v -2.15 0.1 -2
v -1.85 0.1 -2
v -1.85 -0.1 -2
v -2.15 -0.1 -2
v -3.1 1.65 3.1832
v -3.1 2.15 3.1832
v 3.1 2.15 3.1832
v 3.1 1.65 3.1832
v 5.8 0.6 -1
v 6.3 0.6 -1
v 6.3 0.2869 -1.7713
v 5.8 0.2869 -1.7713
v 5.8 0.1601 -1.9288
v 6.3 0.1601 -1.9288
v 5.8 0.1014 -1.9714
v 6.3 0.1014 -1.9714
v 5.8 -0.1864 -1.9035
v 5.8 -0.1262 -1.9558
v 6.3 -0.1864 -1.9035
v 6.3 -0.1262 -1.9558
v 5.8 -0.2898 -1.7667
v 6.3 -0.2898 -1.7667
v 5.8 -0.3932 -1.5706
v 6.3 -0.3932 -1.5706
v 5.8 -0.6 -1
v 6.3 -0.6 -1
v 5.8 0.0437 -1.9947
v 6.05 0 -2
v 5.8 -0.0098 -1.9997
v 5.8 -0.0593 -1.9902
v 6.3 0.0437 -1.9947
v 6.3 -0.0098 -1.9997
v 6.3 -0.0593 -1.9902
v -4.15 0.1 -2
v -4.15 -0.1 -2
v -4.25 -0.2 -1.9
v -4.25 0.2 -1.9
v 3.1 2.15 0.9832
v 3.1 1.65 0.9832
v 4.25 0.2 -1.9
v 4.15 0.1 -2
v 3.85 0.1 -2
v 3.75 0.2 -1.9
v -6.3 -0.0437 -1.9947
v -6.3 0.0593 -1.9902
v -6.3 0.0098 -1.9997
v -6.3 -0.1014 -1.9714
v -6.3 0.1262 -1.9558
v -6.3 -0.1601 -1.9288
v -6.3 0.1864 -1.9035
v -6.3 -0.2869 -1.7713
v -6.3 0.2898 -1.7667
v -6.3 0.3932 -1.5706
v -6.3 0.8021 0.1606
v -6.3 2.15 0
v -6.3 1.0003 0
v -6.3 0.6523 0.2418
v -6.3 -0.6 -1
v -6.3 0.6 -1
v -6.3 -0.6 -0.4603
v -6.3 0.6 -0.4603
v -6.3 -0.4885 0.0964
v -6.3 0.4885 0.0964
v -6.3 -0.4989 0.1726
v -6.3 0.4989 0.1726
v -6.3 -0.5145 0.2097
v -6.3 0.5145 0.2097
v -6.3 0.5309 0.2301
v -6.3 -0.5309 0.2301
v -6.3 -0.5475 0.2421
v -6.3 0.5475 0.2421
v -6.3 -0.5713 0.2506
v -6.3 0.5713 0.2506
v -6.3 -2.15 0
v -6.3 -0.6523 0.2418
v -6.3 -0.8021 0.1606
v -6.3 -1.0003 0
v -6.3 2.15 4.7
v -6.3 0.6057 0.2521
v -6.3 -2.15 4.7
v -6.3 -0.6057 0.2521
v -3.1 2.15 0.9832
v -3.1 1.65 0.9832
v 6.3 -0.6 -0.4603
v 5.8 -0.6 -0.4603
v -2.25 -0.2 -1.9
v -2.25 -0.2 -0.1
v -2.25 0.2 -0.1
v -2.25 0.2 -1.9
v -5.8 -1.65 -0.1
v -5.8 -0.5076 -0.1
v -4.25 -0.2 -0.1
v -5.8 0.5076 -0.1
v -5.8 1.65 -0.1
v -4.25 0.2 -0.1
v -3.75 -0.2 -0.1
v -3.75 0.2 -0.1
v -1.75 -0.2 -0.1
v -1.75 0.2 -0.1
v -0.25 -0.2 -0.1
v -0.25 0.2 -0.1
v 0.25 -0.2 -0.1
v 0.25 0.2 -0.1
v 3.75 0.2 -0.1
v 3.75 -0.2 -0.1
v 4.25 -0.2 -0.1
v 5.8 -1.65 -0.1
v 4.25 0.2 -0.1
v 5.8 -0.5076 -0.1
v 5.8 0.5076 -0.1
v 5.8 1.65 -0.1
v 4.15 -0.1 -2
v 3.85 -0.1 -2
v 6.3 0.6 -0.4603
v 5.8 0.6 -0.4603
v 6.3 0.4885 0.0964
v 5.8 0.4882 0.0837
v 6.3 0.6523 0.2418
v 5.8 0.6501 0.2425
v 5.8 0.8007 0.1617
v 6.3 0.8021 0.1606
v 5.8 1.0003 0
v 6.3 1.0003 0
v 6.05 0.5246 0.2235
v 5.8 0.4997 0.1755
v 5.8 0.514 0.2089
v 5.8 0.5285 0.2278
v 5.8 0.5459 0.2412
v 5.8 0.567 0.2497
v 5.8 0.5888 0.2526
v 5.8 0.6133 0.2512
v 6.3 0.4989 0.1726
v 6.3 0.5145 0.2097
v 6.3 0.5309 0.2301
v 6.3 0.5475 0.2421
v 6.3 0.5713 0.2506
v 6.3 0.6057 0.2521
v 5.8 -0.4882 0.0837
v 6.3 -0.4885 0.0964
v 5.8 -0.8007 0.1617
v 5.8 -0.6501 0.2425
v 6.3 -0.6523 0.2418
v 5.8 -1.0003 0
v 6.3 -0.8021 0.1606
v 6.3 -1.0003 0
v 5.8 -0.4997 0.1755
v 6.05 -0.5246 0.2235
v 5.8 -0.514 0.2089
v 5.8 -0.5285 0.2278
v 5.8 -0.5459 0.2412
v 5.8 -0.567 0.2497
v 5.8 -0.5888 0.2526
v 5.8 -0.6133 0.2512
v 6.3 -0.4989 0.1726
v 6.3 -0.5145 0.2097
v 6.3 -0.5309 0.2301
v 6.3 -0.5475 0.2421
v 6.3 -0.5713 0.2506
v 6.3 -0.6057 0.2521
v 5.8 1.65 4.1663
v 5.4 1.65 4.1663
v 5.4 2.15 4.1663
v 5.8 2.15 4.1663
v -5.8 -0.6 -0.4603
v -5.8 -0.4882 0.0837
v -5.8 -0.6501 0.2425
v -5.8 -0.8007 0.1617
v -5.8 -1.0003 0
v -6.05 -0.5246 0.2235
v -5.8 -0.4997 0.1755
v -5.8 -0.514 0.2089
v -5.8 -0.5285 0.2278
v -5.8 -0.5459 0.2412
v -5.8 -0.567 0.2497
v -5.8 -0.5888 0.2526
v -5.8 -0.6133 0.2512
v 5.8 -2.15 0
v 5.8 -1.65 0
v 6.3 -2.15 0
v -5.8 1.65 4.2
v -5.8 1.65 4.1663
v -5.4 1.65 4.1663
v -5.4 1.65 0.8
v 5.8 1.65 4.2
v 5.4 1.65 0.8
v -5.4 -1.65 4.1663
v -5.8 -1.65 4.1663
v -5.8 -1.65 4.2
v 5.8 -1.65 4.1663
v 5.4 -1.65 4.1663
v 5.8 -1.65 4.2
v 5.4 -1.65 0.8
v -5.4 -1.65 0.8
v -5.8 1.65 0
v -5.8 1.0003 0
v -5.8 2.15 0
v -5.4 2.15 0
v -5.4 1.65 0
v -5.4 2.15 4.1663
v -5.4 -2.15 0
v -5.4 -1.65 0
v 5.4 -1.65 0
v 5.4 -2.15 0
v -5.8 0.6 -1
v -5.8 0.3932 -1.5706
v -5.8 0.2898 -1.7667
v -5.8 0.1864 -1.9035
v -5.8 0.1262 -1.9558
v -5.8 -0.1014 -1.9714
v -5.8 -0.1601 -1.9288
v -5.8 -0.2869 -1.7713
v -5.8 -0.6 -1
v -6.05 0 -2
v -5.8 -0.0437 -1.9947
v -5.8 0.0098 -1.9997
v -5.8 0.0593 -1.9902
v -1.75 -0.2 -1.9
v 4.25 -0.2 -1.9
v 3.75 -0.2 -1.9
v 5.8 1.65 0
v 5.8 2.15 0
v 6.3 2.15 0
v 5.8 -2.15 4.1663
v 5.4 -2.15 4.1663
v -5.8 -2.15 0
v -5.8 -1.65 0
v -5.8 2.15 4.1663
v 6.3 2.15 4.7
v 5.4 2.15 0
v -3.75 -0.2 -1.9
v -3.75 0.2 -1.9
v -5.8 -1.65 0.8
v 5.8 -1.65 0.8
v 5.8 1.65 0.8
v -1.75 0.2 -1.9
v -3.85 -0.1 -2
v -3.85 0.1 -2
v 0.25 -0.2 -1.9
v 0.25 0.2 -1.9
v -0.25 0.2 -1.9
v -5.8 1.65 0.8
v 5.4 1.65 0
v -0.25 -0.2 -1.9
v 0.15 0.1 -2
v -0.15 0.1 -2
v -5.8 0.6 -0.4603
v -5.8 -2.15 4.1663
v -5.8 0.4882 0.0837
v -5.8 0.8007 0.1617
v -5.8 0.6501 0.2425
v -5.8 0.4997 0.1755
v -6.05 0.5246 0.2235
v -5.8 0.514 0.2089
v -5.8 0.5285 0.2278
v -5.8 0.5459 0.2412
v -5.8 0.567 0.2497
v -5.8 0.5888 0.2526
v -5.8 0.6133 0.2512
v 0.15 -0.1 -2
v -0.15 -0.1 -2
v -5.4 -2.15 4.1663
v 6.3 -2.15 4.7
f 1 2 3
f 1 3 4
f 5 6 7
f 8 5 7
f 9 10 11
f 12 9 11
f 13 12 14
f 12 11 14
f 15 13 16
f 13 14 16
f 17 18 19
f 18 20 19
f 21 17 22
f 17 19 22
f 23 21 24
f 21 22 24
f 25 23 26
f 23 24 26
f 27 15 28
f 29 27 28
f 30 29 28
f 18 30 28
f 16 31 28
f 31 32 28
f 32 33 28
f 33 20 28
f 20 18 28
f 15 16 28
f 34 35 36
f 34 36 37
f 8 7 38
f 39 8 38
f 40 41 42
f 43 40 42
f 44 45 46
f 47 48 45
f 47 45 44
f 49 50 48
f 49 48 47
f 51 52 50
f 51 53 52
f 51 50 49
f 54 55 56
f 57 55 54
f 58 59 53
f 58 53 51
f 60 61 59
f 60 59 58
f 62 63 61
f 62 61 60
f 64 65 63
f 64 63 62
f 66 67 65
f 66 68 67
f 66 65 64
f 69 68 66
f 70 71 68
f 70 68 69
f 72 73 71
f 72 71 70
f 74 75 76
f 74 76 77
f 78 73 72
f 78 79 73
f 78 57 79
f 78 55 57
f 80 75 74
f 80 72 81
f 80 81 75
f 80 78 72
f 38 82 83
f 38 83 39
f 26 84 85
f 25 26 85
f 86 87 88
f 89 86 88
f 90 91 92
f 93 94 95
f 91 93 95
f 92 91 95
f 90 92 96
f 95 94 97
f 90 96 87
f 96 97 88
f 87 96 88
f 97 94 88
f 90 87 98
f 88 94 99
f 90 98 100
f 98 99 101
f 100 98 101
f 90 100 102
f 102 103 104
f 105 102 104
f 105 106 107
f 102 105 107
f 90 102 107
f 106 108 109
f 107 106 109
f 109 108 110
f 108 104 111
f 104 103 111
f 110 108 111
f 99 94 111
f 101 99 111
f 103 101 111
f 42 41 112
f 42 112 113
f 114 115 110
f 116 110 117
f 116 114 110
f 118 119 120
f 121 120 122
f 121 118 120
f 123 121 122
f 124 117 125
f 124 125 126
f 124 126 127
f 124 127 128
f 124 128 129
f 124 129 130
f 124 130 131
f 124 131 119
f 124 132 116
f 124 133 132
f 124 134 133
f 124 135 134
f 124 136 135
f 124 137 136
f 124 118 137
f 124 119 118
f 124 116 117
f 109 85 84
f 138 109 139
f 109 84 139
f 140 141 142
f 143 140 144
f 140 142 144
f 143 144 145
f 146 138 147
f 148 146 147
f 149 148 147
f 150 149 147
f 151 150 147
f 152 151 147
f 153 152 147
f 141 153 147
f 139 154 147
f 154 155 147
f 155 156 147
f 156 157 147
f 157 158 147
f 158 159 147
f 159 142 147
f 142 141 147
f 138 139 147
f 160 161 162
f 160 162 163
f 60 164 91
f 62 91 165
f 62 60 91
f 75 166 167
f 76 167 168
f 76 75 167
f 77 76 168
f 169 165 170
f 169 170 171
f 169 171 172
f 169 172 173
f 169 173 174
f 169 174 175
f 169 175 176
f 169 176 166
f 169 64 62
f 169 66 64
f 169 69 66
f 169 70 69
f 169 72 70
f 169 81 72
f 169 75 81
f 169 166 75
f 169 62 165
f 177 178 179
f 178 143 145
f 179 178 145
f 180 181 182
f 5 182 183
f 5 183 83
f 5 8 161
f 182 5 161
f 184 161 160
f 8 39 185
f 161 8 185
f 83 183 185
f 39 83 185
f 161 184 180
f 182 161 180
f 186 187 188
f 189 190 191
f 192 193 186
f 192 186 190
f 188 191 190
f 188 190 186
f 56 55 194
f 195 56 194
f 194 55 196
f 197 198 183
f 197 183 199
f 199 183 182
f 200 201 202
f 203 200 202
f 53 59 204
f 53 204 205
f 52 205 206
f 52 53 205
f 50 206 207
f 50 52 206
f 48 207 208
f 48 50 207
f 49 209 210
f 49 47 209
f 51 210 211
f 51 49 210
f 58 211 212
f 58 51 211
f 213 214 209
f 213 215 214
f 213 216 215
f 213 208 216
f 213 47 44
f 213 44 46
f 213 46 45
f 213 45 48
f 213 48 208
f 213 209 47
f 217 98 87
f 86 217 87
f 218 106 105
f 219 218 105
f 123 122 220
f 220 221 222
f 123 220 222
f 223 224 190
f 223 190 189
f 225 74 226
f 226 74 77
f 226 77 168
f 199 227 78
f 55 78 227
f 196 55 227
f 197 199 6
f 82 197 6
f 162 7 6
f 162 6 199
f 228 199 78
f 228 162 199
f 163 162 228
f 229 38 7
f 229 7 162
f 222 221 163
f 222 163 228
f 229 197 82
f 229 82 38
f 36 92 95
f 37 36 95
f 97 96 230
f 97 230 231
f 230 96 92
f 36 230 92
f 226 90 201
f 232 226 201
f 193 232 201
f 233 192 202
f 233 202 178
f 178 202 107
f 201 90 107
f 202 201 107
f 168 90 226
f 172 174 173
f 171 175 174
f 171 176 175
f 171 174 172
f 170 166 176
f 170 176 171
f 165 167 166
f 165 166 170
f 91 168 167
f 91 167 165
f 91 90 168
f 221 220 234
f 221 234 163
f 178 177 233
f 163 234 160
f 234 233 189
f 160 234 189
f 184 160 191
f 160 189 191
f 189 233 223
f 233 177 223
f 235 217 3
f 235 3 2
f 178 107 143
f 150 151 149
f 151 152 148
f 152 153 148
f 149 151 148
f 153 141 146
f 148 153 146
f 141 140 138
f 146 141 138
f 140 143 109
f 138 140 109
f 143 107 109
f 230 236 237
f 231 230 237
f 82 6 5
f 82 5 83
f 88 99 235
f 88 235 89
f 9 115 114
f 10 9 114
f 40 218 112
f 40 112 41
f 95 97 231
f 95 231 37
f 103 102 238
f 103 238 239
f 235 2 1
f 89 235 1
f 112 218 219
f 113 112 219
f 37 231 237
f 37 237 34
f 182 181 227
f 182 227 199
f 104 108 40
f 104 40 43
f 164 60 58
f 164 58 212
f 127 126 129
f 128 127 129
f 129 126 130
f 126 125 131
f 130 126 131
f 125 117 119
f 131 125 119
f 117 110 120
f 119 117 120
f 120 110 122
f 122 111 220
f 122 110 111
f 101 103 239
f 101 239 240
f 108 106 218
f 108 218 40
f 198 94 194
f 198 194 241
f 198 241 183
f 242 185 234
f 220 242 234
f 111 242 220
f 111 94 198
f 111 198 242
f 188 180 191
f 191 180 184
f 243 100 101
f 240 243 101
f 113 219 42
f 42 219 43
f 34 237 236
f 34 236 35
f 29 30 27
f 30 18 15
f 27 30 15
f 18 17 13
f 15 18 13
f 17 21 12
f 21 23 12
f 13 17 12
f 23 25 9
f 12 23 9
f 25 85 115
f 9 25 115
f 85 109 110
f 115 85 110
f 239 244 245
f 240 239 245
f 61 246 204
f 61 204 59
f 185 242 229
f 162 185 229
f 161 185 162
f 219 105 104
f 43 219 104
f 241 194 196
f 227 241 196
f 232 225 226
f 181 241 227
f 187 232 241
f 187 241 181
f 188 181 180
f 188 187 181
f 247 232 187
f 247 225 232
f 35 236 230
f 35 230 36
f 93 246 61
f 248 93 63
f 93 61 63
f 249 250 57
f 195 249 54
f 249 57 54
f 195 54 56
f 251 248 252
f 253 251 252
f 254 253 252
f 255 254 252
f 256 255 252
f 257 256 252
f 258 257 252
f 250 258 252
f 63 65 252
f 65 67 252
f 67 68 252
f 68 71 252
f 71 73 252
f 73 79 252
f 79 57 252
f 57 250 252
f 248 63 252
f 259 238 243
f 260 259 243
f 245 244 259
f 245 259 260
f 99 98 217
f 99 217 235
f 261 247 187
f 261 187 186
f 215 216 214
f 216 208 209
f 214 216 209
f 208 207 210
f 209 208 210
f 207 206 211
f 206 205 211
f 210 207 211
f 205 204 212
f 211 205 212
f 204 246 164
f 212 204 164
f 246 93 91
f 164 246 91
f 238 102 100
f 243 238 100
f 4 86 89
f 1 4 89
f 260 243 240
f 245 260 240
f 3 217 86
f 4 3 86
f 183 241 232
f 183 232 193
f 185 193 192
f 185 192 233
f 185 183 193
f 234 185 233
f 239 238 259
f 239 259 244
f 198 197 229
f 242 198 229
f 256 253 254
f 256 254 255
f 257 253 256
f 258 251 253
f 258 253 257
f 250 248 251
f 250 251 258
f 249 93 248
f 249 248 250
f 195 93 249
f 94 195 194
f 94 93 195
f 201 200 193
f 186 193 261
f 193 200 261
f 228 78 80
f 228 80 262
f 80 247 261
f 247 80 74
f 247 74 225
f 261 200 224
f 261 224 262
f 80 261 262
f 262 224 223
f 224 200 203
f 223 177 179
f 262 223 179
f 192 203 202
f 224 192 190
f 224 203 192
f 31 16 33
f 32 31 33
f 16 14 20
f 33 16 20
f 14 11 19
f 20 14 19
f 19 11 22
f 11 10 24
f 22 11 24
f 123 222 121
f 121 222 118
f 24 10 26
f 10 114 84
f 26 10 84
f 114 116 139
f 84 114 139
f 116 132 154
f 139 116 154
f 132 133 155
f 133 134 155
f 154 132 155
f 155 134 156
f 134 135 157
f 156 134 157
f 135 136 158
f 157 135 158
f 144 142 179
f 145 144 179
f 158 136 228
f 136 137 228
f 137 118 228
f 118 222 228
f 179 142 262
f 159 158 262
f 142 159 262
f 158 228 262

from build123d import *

# Parameters (mm, degrees)
SKETCH_1_W           = 12.6
SKETCH_1_H           = 4.3
SKETCH_1_W_2         = 11.6
SKETCH_1_H_2         = 3.3
EXTRUDE_1_DEPTH      = 4.7
SKETCH_4_W           = 11.6
SKETCH_4_H           = 3.3
EXTRUDE_3_DEPTH      = 0.5
SKETCH_6_W           = 0.4
SKETCH_6_H           = 4.166312425
CUT_EXTRUDE_2_DEPTH  = 9.959352655
EXTRUDE_4_DEPTH      = 0.8
EXTRUDE_4_DEPTH_BACK = 0.1
SKETCH_7_W           = 11.6
SKETCH_7_H           = 3.3
EXTRUDE_START        = -0.1
SKETCH_8_W           = 0.5
SKETCH_8_H           = 0.4
EXTRUDE_5_DEPTH      = 2
SKETCH_9_W           = 6.2
SKETCH_9_H           = 2.2
CUT_EXTRUDE_3_DEPTH  = 0.5
CUT_EXTRUDE_4_DEPTH  = 0.5
CUT_EXTRUDE_START    = -12.6
CUT_EXTRUDE_5_DEPTH  = 0.5
CHAMFER_1_SIZE       = 0.1


with BuildPart() as part:
    # 草图1 → 拉伸-薄壁1 (new body)
    with BuildSketch(Plane.XY):
        Rectangle(SKETCH_1_W, SKETCH_1_H)
        Rectangle(SKETCH_1_W_2, SKETCH_1_H_2, mode=Mode.SUBTRACT)
    extrude(amount=EXTRUDE_1_DEPTH)

    # 草图4 → 凸台-拉伸3 (add)
    with BuildSketch(Plane.XY.offset(4.7)):
        Rectangle(SKETCH_4_W, SKETCH_4_H)
    extrude(amount=-EXTRUDE_3_DEPTH)

    # 草图6 → 切除-拉伸2 (cut, through all)
    with BuildSketch(Plane.XZ.offset(2.15)):
        with Locations((-5.6, 2.083156213)):
            Rectangle(SKETCH_6_W, SKETCH_6_H)
        with Locations((5.6, 2.083156213)):
            Rectangle(SKETCH_6_W, SKETCH_6_H)
    extrude(amount=-CUT_EXTRUDE_2_DEPTH, mode=Mode.SUBTRACT)



with BuildPart() as body_2:
    # 草图7 → 凸台-拉伸4 (new, two sides: drawn at the far end of the back side and taken through both)
    with BuildSketch(Plane.XY.offset(-EXTRUDE_4_DEPTH_BACK)):
        Rectangle(SKETCH_7_W, SKETCH_7_H)
    extrude(amount=EXTRUDE_4_DEPTH + EXTRUDE_4_DEPTH_BACK)


with BuildPart() as part_1:
    add(part.part)

    add(body_2.part)  # 凸台-拉伸5 merges body 2
    # 草图8 → 凸台-拉伸5 (add)
    with BuildSketch(Plane(origin=(0, 0, -0.1), x_dir=(-1, 0, 0), z_dir=(0, 0, -1)).offset(EXTRUDE_START)):
        with Locations((4, 0)):
            Rectangle(SKETCH_8_W, SKETCH_8_H)
        with Locations((2, 0)):
            Rectangle(SKETCH_8_W, SKETCH_8_H)
        Rectangle(SKETCH_8_W, SKETCH_8_H)
        with Locations((-4, 0)):
            Rectangle(SKETCH_8_W, SKETCH_8_H)
        Polygon((-5.8, 0), (-5.8, 0.6), (-6.3, 0.6), (-6.3, -0.6), (-5.8, -0.6), align=None)
        Polygon((5.8, -0.6), (5.8, 0), (5.8, 0.6), (6.3, 0.6), (6.3, -0.6), align=None)
    extrude(amount=EXTRUDE_5_DEPTH)

    # 草图9 → 切除-拉伸3 (cut)
    with BuildSketch(Plane(origin=(0, 2.15, 0), x_dir=(1, 0, 0), z_dir=(0, 1, 0))):
        with Locations((0, -2.083156212)):
            Rectangle(SKETCH_9_W, SKETCH_9_H)
    extrude(amount=-CUT_EXTRUDE_3_DEPTH, mode=Mode.SUBTRACT)

    # 草图10 → 切除-拉伸4 (cut)
    with BuildSketch(Plane(origin=(6.3, 0, 0), x_dir=(0, 0, -1), z_dir=(1, 0, 0))):
        with BuildLine():
            Line((0, 1.000258095), (0.460284105, 0.6))
            add(Edge.make_bspline(
                [(0.460284105, 0.6), (-0.677187697, 0.248999902), (0, 1.000258095)],
                knots=[0, 0, 0, 1, 1, 1], degree=2))
        make_face()
        with BuildLine():
            Line((0.460284105, -0.6), (0, -1.000258095))
            add(Edge.make_bspline(
                [(0.460284105, -0.6), (-0.677187697, -0.248999902), (0, -1.000258095)],
                knots=[0, 0, 0, 1, 1, 1], degree=2))
        make_face()
        with BuildLine():
            Line((1, 0.6), (4, 0.6))
            Line((4, 0.6), (4.247891551, 0.6))
            Line((4.247891551, 0.6), (4.247891551, -0.6))
            Line((4.247891551, -0.6), (1, -0.6))
            add(Edge.make_bspline(
                [(1, 0.6), (3, 0), (1, -0.6)],
                knots=[0, 0, 0, 1, 1, 1], degree=2))
        make_face()
    extrude(amount=-CUT_EXTRUDE_4_DEPTH, mode=Mode.SUBTRACT)

    # 草图10<2> → 切除-拉伸5 (cut)
    with BuildSketch(Plane(origin=(6.3, 0, 0), x_dir=(0, 0, -1), z_dir=(1, 0, 0)).offset(CUT_EXTRUDE_START)):
        with BuildLine():
            Line((0, 1.000258095), (0.460284105, 0.6))
            add(Edge.make_bspline(
                [(0.460284105, 0.6), (-0.677187697, 0.248999902), (0, 1.000258095)],
                knots=[0, 0, 0, 1, 1, 1], degree=2))
        make_face()
        with BuildLine():
            Line((0.460284105, -0.6), (0, -1.000258095))
            add(Edge.make_bspline(
                [(0.460284105, -0.6), (-0.677187697, -0.248999902), (0, -1.000258095)],
                knots=[0, 0, 0, 1, 1, 1], degree=2))
        make_face()
        with BuildLine():
            Line((1, 0.6), (4, 0.6))
            Line((4, 0.6), (4.247891551, 0.6))
            Line((4.247891551, 0.6), (4.247891551, -0.6))
            Line((4.247891551, -0.6), (1, -0.6))
            add(Edge.make_bspline(
                [(1, 0.6), (3, 0), (1, -0.6)],
                knots=[0, 0, 0, 1, 1, 1], degree=2))
        make_face()
    extrude(amount=CUT_EXTRUDE_5_DEPTH, mode=Mode.SUBTRACT)

    # 倒角1
    chamfer_1_edges = [part_1.edges().sort_by_distance(p)[0] for p in [
        (-4, 0.2, -2),
        (-3.75, 0, -2),
        (-4, -0.2, -2),
        (-4.25, 0, -2),
        (-2, 0.2, -2),
        (-1.75, 0, -2),
        (-2, -0.2, -2),
        (-2.25, 0, -2),
        (4, 0.2, -2),
        (4.25, 0, -2),
        (4, -0.2, -2),
        (3.75, 0, -2),
        (0, 0.2, -2),
        (0.25, 0, -2),
        (0, -0.2, -2),
        (-0.25, 0, -2),
    ]]
    chamfer(chamfer_1_edges, length=CHAMFER_1_SIZE)


solid = part_1.part
